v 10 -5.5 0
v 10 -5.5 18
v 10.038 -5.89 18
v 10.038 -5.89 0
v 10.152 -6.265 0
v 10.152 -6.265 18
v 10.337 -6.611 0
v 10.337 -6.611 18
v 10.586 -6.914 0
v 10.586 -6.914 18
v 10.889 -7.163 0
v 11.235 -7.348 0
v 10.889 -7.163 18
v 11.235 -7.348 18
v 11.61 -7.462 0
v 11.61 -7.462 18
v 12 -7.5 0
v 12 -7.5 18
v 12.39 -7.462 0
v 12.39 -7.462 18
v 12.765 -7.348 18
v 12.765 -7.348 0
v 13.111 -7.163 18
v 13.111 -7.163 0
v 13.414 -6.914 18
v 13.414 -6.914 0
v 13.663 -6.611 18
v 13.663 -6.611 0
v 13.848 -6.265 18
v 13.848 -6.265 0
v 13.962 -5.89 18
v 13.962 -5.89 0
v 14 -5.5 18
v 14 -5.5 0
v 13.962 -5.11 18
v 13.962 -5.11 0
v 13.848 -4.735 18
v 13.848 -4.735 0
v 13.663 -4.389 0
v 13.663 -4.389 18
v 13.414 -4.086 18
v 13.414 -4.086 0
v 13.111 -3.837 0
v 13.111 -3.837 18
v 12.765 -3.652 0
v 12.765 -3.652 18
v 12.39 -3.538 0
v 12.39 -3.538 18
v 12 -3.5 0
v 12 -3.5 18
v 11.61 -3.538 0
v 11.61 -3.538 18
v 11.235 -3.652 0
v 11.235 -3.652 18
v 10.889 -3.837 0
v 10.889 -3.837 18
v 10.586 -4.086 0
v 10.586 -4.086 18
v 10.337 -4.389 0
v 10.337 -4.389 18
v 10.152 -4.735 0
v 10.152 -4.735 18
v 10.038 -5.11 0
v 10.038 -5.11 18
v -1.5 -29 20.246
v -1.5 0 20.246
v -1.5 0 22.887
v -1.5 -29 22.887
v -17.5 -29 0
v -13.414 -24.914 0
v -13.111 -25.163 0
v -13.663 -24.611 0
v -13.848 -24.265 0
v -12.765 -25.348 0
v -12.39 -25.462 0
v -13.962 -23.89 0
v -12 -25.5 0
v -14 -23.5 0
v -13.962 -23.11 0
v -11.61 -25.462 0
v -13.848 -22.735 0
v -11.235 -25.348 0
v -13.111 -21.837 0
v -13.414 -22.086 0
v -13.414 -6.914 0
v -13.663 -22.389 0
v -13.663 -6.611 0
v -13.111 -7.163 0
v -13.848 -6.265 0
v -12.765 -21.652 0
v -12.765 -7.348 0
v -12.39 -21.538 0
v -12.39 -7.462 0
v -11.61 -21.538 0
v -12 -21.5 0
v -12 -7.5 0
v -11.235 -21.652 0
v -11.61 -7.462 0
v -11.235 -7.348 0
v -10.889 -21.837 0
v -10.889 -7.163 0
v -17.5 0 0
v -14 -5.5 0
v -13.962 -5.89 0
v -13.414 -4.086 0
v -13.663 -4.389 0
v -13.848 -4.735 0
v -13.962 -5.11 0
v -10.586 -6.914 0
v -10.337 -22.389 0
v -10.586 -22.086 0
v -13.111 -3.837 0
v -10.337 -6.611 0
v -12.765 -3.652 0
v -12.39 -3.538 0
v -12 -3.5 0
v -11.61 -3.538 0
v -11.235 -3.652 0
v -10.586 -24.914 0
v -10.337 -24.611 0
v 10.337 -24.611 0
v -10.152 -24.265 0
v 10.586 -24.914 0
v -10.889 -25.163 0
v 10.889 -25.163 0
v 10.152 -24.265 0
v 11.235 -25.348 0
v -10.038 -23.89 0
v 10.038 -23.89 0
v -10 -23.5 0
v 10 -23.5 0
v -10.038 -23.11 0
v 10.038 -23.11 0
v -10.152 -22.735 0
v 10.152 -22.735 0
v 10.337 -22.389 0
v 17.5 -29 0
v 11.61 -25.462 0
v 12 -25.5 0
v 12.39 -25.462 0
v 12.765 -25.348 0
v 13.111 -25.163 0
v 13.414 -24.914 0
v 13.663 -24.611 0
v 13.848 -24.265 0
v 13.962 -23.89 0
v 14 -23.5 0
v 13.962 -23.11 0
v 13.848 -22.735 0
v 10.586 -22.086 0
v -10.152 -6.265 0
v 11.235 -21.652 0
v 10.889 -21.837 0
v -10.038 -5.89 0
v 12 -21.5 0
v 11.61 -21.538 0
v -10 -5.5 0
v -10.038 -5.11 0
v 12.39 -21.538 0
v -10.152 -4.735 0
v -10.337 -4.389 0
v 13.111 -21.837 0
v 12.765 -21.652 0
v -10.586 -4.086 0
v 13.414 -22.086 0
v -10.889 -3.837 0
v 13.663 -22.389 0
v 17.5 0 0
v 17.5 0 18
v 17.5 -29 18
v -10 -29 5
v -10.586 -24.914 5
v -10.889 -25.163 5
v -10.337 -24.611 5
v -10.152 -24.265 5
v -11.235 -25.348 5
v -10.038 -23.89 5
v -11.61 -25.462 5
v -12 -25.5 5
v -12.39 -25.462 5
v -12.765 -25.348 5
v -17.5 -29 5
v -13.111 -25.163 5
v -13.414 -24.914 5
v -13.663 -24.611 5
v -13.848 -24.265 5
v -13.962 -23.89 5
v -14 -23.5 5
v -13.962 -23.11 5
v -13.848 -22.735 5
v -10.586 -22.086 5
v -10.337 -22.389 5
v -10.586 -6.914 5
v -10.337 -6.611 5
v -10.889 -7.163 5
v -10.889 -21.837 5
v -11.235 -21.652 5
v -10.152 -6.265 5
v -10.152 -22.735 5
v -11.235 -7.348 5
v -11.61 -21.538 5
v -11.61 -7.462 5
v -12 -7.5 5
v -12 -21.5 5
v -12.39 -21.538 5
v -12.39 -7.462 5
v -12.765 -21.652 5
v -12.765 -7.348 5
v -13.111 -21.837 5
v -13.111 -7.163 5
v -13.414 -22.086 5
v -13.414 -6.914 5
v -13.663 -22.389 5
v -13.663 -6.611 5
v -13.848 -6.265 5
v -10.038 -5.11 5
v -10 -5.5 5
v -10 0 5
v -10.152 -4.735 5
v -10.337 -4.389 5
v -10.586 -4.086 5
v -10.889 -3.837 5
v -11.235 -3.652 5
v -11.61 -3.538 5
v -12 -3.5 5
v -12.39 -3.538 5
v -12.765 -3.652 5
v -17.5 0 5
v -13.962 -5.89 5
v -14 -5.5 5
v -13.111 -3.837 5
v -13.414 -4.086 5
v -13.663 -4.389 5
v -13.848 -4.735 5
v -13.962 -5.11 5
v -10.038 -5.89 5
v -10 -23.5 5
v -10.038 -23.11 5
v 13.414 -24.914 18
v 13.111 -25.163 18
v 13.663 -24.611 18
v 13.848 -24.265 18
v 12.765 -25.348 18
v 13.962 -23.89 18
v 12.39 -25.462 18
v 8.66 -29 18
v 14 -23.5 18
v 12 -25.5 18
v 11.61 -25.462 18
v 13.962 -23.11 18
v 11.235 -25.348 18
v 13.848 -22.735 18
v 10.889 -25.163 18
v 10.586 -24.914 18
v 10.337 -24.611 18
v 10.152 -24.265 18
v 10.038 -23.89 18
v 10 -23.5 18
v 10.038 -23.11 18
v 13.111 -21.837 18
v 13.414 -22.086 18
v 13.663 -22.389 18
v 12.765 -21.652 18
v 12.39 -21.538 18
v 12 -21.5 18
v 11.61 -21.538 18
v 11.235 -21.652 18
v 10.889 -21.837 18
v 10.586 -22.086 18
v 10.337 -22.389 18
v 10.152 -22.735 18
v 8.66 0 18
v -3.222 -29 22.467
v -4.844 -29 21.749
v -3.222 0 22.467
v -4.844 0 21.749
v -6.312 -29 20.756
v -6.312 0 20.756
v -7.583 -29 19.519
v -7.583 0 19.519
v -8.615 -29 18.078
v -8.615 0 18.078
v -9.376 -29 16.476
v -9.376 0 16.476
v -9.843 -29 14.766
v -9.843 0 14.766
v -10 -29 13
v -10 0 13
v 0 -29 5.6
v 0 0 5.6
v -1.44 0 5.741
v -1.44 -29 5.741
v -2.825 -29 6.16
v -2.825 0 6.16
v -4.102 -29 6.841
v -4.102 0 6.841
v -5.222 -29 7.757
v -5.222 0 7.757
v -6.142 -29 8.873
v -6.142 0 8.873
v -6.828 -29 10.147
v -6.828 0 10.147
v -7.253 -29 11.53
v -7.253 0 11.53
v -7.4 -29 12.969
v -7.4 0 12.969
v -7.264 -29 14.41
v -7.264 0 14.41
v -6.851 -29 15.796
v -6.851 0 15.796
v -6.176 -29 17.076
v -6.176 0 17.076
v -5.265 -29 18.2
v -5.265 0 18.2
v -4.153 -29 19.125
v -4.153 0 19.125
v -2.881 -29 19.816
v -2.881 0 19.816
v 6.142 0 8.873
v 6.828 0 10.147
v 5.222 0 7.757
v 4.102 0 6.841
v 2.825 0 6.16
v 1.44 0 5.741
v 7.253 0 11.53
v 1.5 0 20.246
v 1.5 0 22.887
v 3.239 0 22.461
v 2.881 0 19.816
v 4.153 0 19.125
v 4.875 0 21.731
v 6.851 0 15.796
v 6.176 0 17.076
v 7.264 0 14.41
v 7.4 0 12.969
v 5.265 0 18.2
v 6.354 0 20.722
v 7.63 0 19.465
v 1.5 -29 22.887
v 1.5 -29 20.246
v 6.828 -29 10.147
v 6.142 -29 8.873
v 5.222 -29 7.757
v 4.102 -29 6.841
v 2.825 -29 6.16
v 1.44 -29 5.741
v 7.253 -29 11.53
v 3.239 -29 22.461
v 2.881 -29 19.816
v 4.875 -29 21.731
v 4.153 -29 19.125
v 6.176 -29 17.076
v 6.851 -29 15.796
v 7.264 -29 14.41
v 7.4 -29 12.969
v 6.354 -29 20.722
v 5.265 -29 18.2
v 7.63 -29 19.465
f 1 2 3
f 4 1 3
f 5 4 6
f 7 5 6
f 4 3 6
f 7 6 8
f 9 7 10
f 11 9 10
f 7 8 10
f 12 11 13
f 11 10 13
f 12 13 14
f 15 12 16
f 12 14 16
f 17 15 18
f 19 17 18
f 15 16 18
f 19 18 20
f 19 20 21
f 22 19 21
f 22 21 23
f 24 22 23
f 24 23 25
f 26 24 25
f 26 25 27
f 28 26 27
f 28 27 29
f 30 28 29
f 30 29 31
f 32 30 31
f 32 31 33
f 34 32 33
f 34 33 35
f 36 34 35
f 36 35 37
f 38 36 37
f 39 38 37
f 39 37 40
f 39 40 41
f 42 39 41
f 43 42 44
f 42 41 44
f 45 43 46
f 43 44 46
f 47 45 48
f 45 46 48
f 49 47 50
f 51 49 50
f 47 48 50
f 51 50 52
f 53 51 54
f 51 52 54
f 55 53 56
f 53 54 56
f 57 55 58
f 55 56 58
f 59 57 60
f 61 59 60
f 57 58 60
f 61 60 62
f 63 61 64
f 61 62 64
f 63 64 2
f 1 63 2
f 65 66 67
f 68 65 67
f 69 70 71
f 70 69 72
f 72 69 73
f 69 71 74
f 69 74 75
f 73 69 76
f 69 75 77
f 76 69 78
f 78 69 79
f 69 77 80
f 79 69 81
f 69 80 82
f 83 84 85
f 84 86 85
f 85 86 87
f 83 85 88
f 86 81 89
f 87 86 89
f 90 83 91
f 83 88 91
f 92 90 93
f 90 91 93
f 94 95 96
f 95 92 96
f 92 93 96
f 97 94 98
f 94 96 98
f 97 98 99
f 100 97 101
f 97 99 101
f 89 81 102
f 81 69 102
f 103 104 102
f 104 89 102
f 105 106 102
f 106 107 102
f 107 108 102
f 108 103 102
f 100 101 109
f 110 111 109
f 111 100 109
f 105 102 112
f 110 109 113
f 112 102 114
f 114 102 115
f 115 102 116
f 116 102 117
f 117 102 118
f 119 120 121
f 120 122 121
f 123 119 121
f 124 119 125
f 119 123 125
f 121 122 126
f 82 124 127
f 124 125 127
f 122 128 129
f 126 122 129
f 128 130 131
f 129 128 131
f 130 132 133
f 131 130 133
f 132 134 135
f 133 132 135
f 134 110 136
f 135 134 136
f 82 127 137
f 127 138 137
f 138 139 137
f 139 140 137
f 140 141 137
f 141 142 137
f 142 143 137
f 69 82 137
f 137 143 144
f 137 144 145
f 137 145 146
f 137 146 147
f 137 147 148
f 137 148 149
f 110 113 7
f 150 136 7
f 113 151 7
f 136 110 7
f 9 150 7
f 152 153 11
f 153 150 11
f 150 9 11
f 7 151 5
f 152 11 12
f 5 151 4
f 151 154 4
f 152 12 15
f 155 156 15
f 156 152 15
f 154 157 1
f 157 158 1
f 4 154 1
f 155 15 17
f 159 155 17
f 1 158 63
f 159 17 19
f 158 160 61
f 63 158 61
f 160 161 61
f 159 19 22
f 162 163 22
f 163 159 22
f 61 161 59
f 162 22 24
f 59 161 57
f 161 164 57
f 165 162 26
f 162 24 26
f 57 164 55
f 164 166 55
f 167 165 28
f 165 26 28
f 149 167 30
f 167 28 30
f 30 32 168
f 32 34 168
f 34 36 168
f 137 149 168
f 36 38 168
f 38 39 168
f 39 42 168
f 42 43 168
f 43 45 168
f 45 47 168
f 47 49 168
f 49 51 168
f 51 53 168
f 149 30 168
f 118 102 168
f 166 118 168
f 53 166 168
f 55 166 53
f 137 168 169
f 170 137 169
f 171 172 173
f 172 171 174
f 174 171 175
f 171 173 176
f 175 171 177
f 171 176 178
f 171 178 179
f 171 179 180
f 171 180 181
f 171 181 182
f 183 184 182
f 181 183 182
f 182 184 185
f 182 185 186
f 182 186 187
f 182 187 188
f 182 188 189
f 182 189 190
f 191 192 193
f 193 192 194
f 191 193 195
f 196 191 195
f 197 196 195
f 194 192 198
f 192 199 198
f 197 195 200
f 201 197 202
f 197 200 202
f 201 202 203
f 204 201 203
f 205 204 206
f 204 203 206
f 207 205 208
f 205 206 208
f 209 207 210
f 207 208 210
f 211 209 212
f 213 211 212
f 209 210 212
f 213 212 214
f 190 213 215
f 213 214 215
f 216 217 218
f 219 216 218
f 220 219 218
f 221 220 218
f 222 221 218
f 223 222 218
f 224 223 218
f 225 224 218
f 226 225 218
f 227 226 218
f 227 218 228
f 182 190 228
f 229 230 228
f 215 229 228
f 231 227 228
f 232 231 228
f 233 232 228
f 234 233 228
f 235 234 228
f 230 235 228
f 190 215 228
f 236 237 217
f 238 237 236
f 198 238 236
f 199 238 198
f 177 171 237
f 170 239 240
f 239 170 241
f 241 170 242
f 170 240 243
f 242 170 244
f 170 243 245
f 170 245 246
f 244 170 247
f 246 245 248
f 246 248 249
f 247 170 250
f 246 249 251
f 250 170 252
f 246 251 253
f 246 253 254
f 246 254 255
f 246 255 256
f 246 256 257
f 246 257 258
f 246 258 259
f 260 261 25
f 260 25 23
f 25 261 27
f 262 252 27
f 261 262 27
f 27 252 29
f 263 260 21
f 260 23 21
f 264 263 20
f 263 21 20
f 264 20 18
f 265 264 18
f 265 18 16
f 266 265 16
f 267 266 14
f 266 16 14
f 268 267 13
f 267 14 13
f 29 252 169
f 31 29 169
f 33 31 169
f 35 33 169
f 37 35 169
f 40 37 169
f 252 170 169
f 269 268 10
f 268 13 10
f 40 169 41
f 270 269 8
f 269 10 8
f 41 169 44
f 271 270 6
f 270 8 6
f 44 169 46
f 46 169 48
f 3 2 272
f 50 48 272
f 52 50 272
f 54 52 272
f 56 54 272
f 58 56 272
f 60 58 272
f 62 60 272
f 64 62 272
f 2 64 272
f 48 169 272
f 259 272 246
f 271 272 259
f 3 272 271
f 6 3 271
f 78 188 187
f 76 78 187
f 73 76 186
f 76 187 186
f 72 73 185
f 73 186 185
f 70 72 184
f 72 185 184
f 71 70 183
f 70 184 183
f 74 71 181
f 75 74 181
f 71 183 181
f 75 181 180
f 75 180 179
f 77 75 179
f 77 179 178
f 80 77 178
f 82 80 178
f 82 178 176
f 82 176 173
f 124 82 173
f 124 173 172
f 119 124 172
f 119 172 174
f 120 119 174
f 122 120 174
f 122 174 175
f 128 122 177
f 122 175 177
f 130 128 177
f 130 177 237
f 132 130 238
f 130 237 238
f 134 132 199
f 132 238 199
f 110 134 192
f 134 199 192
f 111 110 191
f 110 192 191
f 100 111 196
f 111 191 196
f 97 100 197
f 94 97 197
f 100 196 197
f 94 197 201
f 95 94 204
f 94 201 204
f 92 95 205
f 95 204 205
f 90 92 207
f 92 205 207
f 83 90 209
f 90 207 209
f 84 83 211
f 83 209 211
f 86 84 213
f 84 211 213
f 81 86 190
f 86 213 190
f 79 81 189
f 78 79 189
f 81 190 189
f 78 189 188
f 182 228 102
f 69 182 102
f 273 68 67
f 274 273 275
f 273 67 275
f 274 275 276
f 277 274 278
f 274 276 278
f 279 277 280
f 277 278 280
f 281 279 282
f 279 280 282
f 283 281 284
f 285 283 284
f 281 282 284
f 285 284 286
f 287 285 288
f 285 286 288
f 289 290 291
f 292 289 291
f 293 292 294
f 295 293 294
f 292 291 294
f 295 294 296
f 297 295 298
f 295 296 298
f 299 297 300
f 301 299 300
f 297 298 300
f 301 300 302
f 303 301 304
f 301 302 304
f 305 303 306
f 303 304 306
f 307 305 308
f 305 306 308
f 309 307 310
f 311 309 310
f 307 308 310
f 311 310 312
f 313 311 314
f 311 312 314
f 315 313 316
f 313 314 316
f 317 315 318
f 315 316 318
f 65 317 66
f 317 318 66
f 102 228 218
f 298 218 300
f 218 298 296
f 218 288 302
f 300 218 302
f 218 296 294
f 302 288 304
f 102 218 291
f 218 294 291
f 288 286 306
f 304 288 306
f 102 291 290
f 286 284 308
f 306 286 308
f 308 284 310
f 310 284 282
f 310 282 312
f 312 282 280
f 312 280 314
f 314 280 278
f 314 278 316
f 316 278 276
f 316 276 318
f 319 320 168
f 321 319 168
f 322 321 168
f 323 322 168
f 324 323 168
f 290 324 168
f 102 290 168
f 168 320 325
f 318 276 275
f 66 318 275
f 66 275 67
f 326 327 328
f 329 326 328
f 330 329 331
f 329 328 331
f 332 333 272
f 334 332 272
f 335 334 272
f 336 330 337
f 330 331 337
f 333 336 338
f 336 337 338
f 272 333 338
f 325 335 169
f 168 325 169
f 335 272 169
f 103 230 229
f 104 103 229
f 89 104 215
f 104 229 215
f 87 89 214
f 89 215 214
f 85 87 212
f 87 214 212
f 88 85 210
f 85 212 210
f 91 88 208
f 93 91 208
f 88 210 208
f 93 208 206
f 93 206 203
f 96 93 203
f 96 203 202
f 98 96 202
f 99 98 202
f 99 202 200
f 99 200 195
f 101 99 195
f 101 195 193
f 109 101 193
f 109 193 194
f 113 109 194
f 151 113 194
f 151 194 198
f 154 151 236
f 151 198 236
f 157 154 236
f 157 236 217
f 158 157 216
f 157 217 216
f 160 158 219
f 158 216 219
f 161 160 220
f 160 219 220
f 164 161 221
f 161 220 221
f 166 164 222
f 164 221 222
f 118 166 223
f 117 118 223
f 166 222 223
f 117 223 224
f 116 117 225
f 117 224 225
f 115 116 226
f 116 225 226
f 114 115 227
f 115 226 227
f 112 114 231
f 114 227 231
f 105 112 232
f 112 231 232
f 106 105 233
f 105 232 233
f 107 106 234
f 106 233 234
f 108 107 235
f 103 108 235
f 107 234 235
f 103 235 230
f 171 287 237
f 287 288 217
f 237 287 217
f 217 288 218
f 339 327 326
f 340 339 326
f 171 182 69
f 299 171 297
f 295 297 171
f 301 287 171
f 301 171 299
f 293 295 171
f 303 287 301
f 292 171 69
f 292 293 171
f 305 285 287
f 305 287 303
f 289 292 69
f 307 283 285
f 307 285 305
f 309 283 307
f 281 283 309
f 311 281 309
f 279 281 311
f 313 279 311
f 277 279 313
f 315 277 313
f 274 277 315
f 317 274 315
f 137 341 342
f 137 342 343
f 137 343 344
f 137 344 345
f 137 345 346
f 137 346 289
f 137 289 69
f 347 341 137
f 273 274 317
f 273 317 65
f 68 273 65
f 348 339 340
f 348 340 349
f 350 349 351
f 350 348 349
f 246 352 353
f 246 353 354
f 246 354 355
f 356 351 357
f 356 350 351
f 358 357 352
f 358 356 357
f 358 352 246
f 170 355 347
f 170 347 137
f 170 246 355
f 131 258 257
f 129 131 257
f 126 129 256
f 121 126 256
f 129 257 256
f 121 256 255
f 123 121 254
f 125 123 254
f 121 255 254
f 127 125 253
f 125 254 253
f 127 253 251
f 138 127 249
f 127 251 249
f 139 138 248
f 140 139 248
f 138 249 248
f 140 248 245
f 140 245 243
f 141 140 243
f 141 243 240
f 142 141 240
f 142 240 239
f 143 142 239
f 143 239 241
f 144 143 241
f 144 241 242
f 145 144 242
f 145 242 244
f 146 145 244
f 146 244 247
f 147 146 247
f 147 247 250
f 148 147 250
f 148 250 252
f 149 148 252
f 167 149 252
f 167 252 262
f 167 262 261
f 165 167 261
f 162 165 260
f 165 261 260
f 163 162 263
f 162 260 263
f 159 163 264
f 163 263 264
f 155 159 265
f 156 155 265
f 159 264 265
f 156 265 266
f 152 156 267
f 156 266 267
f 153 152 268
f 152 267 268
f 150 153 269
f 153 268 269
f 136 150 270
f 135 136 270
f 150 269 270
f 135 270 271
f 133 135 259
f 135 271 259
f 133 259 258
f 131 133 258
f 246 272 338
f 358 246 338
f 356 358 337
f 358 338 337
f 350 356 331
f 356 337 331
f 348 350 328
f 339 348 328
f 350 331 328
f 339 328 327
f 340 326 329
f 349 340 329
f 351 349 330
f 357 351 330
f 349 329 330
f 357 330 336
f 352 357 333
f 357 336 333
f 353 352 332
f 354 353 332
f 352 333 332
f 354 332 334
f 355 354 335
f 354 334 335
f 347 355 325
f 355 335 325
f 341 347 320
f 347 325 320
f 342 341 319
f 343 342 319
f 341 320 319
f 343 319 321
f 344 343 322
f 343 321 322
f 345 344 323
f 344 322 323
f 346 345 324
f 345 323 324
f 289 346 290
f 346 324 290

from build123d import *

# Parameters (mm, degrees)
F1_DEPTH = 29
F3_D     = 4


with BuildPart() as f1:
    # F0 (on Front) → F1 (new body)
    with BuildSketch(Plane.XZ):
        with BuildLine():
            Line((-17.5, 0), (0, 0))
            Line((0, 0), (17.5, 0))
            Line((17.5, 0), (17.5, 5))
            Line((17.5, 5), (10, 5))
            Line((10, 5), (10, 13))
            ThreePointArc((10, 13), (9.659258, 15.58819), (8.660254, 18))
            ThreePointArc((8.660254, 18), (5.637201, 21.259659), (1.5, 22.88686))
            Line((1.5, 22.88686), (1.5, 20.246378))
            ThreePointArc((1.5, 20.246378), (7.361494, 12.246077), (0, 5.6))
            ThreePointArc((0, 5.6), (-7.361494, 12.246077), (-1.5, 20.246378))
            Line((-1.5, 20.246378), (-1.5, 22.88686))
            ThreePointArc((-1.5, 22.88686), (-7.582875, 19.519202), (-10, 13))
            Line((-10, 13), (-10, 5))
            Line((-10, 5), (-17.5, 5))
            Line((-17.5, 5), (-17.5, 0))
        make_face()
        with BuildLine():
            Line((10, 5), (17.5, 5))
            Line((17.5, 5), (17.5, 18))
            Line((17.5, 18), (8.660254, 18))
            ThreePointArc((8.660254, 18), (9.659258, 15.58819), (10, 13))
            Line((10, 13), (10, 5))
        make_face()
    extrude(amount=F1_DEPTH)

    # F3 (through all)
    with Locations(Plane(origin=(0, 0, 0), x_dir=(1, 0, 0), z_dir=(0, 0, -1))):
        with Locations((-12, 23.5), (12, 23.5), (-12, 5.5), (12, 5.5)):
            Hole(F3_D / 2)


solid = f1.part
